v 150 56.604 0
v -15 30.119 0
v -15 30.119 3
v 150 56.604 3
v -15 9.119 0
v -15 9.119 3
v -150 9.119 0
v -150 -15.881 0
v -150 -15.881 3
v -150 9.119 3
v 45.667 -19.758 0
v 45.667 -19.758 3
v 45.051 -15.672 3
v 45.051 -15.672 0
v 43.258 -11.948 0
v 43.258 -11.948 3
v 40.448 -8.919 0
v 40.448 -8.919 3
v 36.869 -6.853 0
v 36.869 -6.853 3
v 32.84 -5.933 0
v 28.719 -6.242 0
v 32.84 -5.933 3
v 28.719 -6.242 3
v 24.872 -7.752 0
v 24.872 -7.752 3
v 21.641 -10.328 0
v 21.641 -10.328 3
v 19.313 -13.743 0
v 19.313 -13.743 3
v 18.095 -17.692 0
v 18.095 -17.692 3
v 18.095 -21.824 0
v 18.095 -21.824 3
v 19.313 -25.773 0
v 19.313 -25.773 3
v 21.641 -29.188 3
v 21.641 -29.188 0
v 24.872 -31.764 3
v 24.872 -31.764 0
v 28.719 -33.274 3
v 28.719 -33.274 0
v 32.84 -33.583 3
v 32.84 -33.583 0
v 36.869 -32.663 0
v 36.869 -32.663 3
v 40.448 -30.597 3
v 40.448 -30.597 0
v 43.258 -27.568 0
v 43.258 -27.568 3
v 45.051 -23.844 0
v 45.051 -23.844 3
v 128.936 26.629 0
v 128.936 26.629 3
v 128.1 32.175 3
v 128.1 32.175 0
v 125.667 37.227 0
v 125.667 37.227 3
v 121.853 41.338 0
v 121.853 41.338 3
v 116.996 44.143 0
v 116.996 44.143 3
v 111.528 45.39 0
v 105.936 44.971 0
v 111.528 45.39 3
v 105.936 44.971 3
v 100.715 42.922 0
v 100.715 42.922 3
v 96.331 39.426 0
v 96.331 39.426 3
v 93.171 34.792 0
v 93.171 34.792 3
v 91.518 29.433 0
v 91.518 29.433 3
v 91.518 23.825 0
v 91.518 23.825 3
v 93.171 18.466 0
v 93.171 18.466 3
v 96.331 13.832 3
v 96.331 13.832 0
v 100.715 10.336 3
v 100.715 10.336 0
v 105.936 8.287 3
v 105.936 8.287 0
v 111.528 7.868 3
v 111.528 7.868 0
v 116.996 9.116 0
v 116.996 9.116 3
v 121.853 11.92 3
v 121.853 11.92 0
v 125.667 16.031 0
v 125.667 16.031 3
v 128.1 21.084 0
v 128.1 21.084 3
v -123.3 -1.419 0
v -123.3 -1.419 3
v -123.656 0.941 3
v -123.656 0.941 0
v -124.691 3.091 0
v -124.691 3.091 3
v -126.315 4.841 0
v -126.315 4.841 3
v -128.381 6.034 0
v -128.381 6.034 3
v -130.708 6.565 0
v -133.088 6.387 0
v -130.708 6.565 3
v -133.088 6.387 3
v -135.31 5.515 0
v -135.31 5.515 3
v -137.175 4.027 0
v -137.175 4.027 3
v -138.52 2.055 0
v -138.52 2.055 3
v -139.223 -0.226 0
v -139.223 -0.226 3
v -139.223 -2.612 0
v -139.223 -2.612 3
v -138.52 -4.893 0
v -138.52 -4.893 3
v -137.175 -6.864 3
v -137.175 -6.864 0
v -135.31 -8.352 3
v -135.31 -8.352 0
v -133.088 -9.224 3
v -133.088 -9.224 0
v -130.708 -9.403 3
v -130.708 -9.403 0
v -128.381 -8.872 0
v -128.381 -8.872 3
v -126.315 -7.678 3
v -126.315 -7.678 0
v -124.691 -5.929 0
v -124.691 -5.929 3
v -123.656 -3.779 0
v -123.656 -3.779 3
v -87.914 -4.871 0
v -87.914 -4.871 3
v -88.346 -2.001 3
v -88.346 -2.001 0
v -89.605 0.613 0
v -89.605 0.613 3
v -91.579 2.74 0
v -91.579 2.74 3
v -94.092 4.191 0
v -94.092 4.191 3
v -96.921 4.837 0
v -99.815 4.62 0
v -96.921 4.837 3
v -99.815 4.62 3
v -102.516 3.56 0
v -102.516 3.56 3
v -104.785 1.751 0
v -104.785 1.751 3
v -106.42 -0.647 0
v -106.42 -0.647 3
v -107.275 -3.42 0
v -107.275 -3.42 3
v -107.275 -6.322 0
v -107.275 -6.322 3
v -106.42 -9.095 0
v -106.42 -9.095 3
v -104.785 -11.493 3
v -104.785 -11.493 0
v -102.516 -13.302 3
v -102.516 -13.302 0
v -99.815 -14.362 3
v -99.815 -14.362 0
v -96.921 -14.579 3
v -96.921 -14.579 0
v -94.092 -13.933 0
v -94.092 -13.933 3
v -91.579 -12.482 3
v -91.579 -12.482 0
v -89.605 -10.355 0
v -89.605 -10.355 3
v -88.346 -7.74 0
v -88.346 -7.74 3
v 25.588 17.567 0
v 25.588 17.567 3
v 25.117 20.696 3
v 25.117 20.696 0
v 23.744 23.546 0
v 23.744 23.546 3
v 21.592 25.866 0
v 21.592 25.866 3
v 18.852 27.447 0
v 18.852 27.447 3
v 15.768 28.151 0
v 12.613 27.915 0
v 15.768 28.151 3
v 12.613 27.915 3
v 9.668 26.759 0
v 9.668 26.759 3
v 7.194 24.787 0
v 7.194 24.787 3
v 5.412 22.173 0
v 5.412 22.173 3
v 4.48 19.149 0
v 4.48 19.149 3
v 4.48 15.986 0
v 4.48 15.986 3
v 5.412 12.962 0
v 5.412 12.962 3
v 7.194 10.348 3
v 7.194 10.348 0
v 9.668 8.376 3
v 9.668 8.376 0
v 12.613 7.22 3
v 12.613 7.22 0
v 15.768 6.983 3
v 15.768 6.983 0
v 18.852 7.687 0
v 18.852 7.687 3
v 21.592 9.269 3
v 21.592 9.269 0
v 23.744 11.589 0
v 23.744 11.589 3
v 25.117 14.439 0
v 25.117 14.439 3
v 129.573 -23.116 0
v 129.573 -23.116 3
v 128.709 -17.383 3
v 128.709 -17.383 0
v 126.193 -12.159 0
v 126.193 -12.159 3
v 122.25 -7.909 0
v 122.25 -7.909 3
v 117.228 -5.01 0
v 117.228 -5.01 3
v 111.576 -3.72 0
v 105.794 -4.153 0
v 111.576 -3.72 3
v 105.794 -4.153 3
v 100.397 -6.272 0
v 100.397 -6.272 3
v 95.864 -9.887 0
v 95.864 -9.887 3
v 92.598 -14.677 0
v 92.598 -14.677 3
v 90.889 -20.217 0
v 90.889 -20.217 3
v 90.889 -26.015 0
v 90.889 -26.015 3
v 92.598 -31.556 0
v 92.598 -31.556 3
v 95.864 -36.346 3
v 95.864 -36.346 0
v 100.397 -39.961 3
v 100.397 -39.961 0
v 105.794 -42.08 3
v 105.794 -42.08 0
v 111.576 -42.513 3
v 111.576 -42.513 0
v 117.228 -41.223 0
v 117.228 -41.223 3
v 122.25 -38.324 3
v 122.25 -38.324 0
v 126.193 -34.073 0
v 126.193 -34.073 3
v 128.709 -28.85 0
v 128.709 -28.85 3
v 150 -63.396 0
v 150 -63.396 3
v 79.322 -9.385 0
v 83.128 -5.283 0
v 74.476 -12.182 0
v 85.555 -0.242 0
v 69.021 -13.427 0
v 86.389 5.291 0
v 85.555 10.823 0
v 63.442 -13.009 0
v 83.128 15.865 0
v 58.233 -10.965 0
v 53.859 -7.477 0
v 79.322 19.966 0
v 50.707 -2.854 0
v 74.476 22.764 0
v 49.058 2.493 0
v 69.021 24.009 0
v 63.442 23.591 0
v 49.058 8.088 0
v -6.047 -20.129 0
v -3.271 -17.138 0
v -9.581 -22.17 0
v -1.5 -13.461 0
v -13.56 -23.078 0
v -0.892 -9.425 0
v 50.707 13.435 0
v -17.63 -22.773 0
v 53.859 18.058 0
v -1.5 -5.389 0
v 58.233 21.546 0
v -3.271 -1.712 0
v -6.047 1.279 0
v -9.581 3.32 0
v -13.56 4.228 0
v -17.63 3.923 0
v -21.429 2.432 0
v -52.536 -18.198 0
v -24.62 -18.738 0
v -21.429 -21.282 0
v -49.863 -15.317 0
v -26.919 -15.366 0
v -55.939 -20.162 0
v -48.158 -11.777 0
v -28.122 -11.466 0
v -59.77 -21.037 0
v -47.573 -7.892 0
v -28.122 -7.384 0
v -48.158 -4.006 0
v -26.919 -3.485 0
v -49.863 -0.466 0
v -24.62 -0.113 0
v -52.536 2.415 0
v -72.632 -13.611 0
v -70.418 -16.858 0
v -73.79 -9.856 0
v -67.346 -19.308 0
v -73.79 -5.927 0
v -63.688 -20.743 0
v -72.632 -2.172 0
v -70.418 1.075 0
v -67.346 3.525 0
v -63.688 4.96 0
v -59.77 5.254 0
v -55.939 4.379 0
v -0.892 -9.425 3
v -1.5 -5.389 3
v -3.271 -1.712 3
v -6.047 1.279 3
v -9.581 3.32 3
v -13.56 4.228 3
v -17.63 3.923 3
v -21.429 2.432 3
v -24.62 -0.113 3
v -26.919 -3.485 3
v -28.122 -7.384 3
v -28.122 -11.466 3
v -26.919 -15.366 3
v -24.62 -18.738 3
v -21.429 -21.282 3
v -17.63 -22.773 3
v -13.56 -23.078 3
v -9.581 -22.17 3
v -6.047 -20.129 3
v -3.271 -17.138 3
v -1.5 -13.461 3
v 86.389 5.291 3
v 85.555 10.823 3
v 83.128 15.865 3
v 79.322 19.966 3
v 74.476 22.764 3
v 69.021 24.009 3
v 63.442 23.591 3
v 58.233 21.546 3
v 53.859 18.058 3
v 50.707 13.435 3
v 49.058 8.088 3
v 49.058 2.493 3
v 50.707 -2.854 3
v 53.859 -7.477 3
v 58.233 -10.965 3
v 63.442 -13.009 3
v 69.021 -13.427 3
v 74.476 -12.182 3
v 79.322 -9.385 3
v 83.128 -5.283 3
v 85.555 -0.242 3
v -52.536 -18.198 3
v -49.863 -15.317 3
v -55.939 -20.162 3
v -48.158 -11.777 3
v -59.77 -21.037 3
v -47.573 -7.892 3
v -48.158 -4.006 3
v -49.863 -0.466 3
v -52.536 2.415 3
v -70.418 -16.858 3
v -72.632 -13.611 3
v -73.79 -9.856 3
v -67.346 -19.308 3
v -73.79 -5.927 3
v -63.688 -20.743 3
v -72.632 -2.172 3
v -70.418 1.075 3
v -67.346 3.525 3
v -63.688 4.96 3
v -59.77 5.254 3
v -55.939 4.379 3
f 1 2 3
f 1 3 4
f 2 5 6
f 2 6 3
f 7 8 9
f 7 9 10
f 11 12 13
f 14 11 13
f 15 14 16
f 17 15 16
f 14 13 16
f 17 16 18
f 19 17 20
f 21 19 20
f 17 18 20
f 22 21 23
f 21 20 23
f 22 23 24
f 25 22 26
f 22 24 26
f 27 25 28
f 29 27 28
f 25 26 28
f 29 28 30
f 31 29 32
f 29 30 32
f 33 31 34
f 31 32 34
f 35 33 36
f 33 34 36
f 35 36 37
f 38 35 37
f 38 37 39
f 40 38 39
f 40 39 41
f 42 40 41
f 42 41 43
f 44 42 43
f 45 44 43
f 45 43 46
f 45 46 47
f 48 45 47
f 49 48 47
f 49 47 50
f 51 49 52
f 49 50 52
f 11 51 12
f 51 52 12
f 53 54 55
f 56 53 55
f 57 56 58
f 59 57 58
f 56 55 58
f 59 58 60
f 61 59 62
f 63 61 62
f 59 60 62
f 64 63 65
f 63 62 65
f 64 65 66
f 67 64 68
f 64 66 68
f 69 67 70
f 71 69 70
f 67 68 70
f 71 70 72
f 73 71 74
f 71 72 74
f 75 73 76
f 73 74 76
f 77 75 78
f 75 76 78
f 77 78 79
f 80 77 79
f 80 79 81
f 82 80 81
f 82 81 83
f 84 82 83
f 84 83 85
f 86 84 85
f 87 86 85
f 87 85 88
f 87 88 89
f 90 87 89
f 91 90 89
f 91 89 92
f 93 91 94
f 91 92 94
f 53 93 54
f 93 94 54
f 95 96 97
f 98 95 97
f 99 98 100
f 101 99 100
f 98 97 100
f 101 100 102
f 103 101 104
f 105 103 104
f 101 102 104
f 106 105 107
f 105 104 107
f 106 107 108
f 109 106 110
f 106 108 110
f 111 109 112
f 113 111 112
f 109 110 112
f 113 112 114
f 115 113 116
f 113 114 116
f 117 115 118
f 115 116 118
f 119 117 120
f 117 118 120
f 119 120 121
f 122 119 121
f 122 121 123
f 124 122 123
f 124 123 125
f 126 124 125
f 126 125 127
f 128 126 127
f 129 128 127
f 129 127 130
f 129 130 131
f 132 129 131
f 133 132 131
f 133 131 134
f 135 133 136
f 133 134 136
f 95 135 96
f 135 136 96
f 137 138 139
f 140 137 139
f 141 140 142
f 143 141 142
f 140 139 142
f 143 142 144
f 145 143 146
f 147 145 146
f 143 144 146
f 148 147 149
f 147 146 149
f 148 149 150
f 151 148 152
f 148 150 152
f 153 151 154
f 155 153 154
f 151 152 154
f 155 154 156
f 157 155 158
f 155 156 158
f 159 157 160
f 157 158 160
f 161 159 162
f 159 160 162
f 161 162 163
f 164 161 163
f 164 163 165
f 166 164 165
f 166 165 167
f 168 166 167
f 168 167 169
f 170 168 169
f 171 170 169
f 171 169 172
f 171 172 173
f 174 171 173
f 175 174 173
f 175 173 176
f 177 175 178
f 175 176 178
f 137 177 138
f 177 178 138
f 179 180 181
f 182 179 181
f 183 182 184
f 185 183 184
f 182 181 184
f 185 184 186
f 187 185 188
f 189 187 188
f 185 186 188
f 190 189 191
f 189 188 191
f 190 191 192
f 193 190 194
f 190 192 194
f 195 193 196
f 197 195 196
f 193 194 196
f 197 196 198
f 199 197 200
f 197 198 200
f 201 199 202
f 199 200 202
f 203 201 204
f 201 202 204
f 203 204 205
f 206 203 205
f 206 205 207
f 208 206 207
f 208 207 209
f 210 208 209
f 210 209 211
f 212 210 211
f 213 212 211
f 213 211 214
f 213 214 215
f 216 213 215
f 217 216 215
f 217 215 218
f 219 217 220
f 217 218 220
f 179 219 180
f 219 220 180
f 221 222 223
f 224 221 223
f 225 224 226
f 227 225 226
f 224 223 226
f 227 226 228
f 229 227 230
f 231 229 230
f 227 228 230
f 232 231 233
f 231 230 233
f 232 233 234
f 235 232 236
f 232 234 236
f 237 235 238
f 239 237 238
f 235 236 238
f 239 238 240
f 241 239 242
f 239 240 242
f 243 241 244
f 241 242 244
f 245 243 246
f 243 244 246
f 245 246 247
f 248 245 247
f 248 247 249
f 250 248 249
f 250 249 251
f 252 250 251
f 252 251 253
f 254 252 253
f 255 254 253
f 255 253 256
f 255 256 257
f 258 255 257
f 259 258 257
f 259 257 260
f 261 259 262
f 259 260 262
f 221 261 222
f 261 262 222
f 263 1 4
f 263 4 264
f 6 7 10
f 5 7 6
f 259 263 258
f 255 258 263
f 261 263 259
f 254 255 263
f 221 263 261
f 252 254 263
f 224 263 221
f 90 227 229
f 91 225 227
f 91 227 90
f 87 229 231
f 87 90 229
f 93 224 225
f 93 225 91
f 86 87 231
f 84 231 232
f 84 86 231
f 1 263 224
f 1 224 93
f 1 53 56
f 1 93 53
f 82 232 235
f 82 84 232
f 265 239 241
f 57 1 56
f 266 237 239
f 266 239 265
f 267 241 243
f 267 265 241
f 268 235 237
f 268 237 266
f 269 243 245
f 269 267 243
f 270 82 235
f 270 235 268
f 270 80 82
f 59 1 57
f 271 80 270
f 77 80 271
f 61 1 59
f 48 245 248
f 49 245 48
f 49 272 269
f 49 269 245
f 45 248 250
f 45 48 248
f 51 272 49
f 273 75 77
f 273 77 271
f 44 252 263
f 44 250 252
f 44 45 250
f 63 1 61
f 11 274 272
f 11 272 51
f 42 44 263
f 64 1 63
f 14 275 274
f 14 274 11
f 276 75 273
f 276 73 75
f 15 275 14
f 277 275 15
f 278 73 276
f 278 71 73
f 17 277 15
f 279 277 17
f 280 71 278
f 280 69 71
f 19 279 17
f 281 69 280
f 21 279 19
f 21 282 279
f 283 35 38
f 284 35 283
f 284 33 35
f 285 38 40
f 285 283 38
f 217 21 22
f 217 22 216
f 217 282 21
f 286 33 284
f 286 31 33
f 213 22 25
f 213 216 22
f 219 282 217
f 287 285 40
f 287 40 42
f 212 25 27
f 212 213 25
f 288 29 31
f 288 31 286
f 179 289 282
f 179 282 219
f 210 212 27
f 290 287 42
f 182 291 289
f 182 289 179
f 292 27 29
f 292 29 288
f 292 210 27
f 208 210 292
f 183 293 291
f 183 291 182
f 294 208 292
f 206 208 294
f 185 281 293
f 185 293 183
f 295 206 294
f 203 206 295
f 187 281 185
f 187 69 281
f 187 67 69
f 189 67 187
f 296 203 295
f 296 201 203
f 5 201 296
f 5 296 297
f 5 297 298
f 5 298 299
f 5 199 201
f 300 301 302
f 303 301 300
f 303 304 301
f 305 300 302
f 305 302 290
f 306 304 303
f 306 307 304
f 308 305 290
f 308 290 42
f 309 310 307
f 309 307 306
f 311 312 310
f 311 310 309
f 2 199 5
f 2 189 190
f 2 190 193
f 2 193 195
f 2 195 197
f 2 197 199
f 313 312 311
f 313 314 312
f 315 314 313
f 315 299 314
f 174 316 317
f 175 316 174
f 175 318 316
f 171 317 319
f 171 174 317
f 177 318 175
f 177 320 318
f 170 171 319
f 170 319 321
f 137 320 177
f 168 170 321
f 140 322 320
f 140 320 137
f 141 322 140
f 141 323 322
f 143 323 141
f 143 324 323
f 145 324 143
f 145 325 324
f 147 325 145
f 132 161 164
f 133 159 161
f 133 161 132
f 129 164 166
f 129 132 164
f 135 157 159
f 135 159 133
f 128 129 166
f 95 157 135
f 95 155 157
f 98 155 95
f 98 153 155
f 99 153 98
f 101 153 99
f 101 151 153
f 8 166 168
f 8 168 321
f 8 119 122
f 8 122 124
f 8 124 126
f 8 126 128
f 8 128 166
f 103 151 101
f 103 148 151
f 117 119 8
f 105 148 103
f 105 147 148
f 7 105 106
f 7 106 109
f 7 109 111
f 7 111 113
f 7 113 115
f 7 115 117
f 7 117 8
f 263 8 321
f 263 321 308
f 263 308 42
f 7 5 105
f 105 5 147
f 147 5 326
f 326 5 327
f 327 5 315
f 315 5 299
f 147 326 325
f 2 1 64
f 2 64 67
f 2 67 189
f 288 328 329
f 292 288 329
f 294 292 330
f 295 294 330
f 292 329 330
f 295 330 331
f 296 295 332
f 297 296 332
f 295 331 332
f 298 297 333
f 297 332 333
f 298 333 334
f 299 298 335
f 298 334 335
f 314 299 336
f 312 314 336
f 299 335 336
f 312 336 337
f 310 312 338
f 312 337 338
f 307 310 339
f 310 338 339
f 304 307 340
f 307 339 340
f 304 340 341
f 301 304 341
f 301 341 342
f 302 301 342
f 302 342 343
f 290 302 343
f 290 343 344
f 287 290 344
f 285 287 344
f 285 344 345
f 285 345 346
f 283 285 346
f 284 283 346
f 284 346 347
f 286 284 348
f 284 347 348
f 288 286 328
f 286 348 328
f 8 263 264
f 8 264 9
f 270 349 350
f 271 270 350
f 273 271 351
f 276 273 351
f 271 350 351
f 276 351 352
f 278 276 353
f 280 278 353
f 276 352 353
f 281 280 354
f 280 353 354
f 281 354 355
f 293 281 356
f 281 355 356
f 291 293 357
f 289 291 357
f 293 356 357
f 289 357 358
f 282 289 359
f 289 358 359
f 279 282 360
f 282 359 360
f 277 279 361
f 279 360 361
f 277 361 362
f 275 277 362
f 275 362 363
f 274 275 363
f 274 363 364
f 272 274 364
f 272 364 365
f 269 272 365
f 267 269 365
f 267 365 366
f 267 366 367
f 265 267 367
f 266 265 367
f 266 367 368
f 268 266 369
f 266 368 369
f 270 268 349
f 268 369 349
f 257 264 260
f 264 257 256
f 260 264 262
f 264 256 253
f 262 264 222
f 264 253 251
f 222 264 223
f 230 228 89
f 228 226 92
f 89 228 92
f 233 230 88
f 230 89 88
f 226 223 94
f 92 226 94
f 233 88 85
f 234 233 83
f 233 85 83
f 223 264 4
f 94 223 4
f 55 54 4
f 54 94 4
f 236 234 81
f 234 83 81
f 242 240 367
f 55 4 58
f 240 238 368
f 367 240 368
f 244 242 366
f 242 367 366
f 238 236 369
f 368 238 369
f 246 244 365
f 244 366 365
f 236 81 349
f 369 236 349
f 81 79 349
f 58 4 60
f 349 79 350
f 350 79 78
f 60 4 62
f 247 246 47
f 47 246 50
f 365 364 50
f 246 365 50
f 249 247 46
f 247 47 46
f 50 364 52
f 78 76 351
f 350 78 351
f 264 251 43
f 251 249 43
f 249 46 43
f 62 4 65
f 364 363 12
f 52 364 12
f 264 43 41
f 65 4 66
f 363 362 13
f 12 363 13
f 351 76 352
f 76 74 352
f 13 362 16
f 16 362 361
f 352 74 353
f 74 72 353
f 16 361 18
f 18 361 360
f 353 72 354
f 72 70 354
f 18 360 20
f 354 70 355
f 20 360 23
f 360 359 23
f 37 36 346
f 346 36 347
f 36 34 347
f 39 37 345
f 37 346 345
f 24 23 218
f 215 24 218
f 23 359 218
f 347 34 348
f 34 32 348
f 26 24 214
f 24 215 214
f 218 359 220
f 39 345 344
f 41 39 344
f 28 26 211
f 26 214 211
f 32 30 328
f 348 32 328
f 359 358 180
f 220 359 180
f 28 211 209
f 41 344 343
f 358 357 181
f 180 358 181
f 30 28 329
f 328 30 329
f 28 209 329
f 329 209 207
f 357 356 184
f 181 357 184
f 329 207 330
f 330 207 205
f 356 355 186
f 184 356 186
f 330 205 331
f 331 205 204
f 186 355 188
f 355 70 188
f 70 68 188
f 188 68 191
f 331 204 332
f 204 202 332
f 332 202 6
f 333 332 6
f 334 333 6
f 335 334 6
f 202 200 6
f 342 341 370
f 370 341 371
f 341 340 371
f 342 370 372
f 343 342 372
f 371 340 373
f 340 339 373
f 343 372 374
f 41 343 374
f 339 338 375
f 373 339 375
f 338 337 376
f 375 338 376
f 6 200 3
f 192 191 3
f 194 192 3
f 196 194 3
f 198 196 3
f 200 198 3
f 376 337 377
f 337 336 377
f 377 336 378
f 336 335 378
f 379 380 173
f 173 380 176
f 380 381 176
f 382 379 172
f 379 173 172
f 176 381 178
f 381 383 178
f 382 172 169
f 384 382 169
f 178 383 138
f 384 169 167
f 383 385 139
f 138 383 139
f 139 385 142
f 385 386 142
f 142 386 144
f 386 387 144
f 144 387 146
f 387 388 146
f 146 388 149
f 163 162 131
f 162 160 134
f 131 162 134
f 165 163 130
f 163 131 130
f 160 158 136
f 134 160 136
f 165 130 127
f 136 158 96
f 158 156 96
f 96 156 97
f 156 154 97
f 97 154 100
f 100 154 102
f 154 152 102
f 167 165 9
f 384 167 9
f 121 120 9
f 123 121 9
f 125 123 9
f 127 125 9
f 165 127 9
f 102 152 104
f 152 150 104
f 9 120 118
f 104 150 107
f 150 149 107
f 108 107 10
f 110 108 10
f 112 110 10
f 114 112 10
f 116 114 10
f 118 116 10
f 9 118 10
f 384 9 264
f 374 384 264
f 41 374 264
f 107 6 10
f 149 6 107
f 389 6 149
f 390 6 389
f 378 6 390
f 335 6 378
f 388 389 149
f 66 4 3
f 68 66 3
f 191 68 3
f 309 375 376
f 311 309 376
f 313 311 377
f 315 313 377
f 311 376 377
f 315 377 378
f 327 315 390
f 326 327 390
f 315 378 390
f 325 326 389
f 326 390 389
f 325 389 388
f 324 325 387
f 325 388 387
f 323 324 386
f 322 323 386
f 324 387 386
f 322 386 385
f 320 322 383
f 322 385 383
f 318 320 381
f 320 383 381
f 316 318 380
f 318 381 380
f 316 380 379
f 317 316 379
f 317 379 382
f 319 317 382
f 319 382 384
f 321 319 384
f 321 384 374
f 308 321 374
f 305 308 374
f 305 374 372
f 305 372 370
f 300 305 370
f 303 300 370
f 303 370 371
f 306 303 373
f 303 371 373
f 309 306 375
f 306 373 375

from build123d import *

# Parameters (mm, degrees)
BOSS_EXTRUDE1_DEPTH = 3
SKETCH2_R           = 8.006187357
SKETCH2_R_2         = 9.735262488
SKETCH2_R_3         = 13.182196279
SKETCH2_R_4         = 13.691397608
SKETCH2_R_5         = 19.450771096
SKETCH2_R_6         = 18.813943393
SKETCH2_R_7         = 18.770594662
SKETCH2_R_8         = 13.863766026
SKETCH2_R_9         = 10.613691542
CUT_EXTRUDE1_DEPTH  = 3


with BuildPart() as part:
    # Sketch1 → Boss-Extrude1 (new body)
    with BuildSketch(Plane.XY):
        Polygon((150, 56.603970605), (150, -63.396029395), (-150, -15.880697298), (-150, 9.119302702), (-15, 9.119302702), (-15, 30.119302702), align=None)
    extrude(amount=BOSS_EXTRUDE1_DEPTH)

    # Sketch2 → Cut-Extrude1 (cut)
    with BuildSketch(Plane.XY.offset(3)):
        with Locations((-131.306408306, -1.418891545)):
            Circle(SKETCH2_R)
        with Locations((-97.648790291, -4.870954931)):
            Circle(SKETCH2_R_2)
        with Locations((-60.754862852, -7.891510394)):
            Circle(SKETCH2_R_3)
        with Locations((-14.583515063, -9.425078902)):
            Circle(SKETCH2_R_4)
        with Locations((110.12227476, -23.116476509)):
            Circle(SKETCH2_R_5)
        with Locations((110.12227476, 26.629123467)):
            Circle(SKETCH2_R_6)
        with Locations((67.618744319, 5.290685885)):
            Circle(SKETCH2_R_7)
        with Locations((31.803586688, -19.757978284)):
            Circle(SKETCH2_R_8)
        with Locations((14.974777681, 17.567457079)):
            Circle(SKETCH2_R_9)
    extrude(amount=-CUT_EXTRUDE1_DEPTH, mode=Mode.SUBTRACT)


solid = part.part
